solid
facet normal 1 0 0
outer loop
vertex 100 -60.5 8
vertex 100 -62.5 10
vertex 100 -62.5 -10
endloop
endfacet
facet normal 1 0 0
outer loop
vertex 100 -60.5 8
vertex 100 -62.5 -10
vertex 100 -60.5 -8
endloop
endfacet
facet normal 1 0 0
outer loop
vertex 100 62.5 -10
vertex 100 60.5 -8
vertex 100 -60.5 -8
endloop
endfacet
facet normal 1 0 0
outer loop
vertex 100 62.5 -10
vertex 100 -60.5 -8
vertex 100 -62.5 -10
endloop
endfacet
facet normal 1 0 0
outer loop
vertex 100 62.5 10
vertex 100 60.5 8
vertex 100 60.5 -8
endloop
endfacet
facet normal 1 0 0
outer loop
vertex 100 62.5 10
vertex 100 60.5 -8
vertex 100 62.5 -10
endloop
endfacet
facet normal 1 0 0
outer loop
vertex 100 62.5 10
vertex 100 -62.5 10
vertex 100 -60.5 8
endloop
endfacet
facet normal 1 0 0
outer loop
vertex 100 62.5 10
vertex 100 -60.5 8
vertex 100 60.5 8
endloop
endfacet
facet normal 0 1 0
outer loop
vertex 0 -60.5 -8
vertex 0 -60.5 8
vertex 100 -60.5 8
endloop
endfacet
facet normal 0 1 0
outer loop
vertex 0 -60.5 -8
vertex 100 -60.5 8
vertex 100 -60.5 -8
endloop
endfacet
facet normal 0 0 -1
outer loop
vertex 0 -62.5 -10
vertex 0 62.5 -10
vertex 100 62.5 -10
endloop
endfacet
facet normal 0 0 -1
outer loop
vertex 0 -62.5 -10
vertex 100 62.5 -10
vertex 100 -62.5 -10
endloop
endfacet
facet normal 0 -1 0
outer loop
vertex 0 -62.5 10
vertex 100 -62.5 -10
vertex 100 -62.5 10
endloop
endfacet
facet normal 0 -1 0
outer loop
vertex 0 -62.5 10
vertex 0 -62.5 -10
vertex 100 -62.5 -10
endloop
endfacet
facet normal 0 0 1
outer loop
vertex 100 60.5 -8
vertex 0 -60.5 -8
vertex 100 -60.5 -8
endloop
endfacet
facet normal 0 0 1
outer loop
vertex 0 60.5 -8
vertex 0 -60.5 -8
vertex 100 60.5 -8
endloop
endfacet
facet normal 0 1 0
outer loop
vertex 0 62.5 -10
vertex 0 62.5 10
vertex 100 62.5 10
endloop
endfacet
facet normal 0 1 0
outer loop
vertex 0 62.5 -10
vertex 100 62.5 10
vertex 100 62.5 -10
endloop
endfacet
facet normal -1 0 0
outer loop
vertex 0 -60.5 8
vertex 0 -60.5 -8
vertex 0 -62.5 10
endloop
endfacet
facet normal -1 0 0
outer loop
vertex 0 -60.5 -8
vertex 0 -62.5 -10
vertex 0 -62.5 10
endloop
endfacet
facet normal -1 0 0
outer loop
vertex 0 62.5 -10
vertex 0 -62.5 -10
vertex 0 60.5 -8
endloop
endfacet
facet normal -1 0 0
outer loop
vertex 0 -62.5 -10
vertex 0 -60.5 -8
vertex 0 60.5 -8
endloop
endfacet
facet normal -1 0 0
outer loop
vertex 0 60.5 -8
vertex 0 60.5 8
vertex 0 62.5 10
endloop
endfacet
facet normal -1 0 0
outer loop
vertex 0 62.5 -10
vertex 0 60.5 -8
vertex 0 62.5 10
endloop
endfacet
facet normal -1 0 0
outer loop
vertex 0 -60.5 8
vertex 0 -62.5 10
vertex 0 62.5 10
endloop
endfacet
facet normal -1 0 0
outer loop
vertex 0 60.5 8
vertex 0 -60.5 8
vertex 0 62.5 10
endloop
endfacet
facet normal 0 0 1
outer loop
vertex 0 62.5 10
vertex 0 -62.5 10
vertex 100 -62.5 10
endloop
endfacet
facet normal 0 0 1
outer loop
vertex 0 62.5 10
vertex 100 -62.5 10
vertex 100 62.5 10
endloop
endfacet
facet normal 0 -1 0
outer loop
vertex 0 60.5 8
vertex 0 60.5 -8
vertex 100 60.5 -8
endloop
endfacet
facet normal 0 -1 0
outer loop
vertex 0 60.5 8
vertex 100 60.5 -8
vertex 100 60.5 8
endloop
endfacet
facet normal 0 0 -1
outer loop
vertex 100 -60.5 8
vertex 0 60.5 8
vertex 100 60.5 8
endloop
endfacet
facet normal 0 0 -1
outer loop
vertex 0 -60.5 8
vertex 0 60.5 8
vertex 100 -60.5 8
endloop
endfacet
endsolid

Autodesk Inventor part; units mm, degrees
ref_plane "YZ Plane" through (0, 0, 0) normal (1, 0, 0) x (0, 1, 0)
ref_plane "XZ Plane" through (0, 0, 0) normal (0, 1, 0) x (-1, 0, 0)
ref_plane "XY Plane" through (0, 0, 0) normal (0, 0, 1) x (1, 0, 0)
sketch "Sketch1" plane through (0, 0, 0) normal (1, 0, 0) x (0, 1, 0)
  line L0 (-62.5, 10) -> (62.5, 10)
  line L1 (62.5, 10) -> (62.5, -10)
  line L2 (62.5, -10) -> (-62.5, -10)
  line L3 (-62.5, -10) -> (-62.5, 10)
  line L4 (-62.5, 10) -> (62.5, -10) construction
  line L5 (62.5, 10) -> (-62.5, -10) construction
  line L6 (60.5, -8) -> (60.5, 8)
  line L7 (60.5, 8) -> (-60.5, 8)
  line L8 (-60.5, 8) -> (-60.5, -8)
  line L9 (-60.5, -8) -> (60.5, -8)
  point P0 (0, 0)
  dimension "d0" = 125
  dimension "d1" = 20
  dimension "d2" = 2
extrude "Extrusion1" add sketch "Sketch1" along normal blind 100
properties part number "Motor Mount" material "Aluminum 6061"
